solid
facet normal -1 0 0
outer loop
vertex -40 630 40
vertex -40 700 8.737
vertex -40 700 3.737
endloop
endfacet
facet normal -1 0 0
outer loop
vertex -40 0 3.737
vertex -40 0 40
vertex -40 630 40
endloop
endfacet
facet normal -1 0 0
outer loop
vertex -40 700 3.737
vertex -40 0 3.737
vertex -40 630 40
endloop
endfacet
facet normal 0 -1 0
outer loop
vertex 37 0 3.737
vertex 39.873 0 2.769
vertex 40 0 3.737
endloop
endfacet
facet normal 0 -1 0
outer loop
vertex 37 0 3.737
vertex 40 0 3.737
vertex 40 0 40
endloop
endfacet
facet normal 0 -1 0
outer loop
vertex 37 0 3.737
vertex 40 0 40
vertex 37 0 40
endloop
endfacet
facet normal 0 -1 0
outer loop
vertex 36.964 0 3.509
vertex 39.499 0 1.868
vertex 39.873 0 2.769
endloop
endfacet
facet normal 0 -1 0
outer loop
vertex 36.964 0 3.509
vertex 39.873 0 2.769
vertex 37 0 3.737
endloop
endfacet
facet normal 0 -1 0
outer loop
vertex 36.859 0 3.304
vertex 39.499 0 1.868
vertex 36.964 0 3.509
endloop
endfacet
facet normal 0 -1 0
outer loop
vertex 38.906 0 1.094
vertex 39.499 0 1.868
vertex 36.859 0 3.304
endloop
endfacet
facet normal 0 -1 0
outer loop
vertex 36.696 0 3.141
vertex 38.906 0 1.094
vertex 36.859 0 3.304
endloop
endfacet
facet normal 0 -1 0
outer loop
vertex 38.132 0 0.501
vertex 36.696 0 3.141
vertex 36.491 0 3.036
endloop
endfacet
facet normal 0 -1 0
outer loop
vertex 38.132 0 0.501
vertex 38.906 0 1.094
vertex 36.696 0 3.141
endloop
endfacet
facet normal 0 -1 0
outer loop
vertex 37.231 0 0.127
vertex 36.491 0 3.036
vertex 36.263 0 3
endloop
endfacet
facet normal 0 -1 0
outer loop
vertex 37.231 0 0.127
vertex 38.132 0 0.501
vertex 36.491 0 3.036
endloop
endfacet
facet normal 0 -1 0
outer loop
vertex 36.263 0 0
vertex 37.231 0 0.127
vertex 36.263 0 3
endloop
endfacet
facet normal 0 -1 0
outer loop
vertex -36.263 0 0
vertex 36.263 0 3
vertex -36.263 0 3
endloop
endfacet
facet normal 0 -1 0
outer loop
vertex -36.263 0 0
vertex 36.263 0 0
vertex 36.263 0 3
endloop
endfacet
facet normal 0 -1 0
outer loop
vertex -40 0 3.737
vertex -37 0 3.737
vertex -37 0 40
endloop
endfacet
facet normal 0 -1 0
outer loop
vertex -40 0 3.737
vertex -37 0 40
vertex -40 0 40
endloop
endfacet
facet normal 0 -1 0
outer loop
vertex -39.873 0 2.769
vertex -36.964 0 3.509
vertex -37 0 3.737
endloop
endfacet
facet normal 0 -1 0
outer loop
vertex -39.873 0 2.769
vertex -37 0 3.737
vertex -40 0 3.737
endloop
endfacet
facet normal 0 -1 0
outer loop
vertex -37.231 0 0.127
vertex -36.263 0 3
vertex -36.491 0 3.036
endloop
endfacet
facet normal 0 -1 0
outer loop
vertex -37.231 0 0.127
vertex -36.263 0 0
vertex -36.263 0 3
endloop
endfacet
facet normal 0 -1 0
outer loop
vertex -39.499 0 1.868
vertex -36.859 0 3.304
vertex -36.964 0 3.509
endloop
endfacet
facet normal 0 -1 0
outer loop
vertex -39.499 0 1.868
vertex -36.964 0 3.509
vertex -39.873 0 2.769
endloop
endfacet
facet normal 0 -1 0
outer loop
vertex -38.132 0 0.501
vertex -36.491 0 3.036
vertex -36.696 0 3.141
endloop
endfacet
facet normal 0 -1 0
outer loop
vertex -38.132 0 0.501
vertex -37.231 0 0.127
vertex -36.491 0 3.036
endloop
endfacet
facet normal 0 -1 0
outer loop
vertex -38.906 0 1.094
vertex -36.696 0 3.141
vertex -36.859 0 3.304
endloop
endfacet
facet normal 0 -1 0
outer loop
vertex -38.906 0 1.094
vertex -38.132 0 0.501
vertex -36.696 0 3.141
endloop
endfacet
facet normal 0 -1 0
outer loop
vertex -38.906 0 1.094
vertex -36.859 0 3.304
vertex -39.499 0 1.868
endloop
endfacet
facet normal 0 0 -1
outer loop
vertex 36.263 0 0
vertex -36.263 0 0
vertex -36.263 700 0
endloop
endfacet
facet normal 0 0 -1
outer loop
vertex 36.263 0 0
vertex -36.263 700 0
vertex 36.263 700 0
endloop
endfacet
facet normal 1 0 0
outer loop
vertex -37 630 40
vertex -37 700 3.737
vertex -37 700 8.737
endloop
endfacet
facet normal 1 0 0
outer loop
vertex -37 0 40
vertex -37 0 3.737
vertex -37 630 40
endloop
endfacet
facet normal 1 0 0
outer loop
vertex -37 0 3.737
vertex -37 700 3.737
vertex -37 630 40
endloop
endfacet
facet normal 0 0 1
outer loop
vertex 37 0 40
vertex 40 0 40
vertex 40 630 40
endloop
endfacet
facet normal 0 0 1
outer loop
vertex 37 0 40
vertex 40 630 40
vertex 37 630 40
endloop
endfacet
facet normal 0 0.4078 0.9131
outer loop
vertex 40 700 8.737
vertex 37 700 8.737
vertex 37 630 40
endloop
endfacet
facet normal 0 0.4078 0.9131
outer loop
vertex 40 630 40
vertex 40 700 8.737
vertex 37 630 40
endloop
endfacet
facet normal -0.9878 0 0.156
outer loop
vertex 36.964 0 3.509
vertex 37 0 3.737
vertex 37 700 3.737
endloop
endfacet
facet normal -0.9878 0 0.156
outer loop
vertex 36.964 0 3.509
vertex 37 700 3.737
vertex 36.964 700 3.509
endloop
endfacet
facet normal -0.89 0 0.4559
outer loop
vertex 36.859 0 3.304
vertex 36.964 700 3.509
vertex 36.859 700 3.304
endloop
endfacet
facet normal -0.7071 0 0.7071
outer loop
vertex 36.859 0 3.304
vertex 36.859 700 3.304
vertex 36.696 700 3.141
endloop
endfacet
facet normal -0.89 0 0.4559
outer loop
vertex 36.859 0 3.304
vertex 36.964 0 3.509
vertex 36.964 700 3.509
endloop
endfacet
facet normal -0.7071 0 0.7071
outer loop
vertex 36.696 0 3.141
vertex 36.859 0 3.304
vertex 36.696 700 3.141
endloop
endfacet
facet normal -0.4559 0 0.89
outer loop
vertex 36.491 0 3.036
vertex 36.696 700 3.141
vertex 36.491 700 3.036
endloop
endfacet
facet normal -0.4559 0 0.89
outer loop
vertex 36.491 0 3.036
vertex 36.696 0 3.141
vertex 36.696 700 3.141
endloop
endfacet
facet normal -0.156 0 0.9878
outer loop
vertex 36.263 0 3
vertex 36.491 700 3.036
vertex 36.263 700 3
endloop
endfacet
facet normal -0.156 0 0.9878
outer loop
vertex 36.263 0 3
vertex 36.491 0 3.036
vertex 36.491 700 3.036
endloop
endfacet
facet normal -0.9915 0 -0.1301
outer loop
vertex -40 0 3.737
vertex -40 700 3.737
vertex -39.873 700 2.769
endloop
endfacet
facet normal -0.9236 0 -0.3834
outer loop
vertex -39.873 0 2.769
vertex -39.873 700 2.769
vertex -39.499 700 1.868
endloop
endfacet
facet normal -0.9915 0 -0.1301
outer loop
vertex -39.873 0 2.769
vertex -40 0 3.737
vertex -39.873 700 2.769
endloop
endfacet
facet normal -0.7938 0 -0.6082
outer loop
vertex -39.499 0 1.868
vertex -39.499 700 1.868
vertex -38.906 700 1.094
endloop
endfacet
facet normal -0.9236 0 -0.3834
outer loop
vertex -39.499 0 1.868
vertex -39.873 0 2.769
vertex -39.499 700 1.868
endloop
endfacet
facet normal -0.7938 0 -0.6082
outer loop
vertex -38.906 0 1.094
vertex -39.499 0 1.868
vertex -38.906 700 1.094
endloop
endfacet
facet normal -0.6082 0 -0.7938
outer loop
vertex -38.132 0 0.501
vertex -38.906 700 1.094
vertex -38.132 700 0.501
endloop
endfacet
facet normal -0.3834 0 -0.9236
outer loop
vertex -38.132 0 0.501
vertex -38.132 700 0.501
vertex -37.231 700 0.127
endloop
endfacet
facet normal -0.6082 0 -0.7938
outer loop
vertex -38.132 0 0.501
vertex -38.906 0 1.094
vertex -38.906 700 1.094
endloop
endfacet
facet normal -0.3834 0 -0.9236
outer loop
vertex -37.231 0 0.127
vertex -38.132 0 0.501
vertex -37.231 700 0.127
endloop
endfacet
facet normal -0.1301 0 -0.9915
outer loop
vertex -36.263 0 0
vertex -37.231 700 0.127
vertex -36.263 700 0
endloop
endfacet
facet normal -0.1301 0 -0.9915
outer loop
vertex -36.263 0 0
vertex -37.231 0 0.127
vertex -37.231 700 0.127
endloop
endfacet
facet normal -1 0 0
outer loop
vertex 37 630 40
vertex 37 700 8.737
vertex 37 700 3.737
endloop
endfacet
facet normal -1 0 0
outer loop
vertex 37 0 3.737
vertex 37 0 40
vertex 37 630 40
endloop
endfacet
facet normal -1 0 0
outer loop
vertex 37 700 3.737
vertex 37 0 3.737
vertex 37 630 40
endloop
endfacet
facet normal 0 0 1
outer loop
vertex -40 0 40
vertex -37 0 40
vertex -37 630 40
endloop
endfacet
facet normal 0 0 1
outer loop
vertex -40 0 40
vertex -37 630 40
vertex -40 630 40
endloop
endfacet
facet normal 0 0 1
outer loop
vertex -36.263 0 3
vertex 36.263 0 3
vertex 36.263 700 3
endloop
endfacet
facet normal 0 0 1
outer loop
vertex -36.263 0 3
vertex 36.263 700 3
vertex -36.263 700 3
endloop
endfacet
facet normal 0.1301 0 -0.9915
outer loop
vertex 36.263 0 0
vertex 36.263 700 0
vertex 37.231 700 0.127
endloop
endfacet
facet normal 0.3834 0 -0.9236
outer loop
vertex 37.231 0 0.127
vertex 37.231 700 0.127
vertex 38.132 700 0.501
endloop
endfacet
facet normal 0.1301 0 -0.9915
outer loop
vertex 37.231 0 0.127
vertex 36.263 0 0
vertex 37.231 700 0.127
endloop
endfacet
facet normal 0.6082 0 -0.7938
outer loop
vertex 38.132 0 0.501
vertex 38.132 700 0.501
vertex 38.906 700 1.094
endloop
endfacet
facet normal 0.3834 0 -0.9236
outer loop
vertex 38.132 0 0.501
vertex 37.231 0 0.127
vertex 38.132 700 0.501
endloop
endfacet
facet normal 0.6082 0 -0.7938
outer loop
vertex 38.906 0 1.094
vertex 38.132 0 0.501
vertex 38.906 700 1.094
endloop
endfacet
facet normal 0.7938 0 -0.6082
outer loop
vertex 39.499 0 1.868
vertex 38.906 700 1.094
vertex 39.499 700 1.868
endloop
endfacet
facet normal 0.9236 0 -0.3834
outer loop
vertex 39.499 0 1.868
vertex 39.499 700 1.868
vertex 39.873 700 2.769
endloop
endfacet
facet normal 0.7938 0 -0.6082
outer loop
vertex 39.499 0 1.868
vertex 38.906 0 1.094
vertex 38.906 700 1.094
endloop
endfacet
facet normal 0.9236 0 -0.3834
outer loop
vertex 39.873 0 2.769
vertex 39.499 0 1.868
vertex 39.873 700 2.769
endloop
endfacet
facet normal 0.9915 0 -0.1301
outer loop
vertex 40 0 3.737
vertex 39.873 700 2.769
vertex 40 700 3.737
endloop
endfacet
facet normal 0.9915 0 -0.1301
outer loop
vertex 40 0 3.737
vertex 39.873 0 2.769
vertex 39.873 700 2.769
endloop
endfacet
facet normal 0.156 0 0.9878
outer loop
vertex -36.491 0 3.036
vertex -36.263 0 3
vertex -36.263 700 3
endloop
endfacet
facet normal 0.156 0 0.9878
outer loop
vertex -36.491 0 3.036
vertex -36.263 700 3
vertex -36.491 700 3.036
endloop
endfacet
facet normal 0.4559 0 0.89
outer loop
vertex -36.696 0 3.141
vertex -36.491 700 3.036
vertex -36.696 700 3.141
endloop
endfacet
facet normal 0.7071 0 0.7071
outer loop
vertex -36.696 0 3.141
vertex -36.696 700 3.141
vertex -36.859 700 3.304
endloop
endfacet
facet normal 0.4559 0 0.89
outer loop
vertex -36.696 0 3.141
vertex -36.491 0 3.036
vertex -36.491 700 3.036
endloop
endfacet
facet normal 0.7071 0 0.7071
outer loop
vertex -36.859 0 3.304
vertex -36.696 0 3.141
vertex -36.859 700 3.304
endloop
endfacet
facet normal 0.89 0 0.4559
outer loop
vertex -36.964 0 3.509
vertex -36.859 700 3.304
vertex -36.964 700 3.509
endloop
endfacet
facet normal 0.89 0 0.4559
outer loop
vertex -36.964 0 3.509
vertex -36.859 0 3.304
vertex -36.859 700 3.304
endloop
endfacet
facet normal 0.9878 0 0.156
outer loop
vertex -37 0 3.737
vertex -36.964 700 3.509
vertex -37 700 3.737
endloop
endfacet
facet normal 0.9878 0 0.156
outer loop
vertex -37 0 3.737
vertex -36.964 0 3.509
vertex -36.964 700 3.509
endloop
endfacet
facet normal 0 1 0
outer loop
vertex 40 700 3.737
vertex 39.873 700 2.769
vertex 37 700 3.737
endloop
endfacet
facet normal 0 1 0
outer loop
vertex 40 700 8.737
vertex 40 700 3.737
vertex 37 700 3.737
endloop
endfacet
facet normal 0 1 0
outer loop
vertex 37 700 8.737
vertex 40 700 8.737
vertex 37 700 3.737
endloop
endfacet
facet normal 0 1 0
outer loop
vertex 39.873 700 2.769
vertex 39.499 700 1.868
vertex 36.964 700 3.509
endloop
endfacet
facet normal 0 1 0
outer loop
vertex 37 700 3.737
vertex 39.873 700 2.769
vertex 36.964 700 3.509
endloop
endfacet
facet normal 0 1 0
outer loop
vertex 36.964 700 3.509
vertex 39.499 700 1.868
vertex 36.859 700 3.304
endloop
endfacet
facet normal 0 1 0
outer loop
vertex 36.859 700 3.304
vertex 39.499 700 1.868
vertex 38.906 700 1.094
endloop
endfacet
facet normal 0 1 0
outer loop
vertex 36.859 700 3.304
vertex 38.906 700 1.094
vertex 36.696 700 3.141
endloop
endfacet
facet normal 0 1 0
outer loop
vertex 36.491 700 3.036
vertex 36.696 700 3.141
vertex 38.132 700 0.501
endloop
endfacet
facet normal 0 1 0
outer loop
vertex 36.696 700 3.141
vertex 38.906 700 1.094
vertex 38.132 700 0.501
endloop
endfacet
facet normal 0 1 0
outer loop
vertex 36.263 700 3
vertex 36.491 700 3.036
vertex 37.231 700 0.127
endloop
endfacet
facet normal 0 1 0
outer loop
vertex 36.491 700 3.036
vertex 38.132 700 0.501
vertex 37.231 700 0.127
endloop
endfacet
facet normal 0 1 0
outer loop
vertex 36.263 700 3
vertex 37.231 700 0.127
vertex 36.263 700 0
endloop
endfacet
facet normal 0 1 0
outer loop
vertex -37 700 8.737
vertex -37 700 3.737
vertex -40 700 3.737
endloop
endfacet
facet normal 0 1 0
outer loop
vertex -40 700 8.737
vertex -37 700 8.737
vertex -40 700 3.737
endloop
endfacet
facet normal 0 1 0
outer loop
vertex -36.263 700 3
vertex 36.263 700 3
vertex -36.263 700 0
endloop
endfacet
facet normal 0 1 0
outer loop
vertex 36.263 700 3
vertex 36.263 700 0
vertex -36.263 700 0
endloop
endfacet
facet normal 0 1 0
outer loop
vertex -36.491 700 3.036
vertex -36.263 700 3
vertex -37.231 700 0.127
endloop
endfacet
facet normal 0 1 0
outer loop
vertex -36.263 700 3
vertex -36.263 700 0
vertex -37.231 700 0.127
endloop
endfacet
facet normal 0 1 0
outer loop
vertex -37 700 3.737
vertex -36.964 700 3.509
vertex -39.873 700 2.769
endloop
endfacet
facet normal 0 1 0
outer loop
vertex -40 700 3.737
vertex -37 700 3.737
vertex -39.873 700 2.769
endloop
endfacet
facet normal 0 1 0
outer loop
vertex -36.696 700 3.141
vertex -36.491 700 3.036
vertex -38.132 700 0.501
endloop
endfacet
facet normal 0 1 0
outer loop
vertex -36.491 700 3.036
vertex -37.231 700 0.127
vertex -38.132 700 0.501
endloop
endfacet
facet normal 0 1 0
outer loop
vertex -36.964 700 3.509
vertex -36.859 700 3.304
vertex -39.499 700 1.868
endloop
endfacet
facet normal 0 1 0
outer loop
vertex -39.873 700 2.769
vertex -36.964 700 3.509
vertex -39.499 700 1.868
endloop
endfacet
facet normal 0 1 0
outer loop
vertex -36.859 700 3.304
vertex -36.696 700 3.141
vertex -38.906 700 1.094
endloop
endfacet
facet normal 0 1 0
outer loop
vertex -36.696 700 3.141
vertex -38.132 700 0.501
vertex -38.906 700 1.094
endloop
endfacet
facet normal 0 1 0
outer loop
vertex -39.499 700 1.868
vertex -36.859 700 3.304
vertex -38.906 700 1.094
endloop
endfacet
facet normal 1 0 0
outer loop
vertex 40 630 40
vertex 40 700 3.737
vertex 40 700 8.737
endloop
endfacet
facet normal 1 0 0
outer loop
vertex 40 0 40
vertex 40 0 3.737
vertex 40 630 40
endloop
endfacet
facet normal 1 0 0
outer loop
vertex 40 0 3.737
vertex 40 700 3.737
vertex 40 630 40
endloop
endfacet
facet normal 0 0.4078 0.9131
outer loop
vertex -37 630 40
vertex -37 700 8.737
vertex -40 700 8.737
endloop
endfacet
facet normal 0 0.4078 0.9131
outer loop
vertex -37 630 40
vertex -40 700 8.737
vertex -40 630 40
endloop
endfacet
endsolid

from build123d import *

# Parameters (mm, degrees)
BASE_FLANGE1_DEPTH             = 700
CUT_EXTRUDE1_REACH             = 704.282
CUT_EXTRUDE1_DIRECTION_2_REACH = 704.282


# Sheet-metal steps are written as plain solids
with BuildPart() as part:
    # Sketch1 → Base-Flange1 (new body)
    with BuildSketch(Plane(origin=(0, 0, 0), x_dir=(1, 0, 0), z_dir=(0, 1, 0))):
        with BuildLine():
            Line((-40, -40), (-40, -3.7366))
            ThreePointArc((-40, -3.7366), (-38.905575199, -1.094424801), (-36.2634, 0))
            Line((-36.2634, 0), (36.2634, 0))
            ThreePointArc((36.2634, 0), (38.905575199, -1.094424801), (40, -3.7366))
            Line((40, -3.7366), (40, -40))
            Line((40, -40), (37, -40))
            Line((37, -40), (37, -3.7366))
            ThreePointArc((37, -3.7366), (36.784254855, -3.215745145), (36.2634, -3))
            Line((36.2634, -3), (-36.2634, -3))
            ThreePointArc((-36.2634, -3), (-36.784254855, -3.215745145), (-37, -3.7366))
            Line((-37, -3.7366), (-37, -40))
            Line((-37, -40), (-40, -40))
        make_face()
    extrude(amount=BASE_FLANGE1_DEPTH)

    # Cut-Extrude1: up to this face of the body (flat: up to its plane)
    cut_extrude1_end = Plane(part.part.faces().sort_by_distance((-40, 350, 21.8683))[0])
    # Sketch6 → Cut-Extrude1 (cut, up to the picked face)
    with BuildSketch(Plane(origin=(0, 0, 0), x_dir=(0, 0, -1), z_dir=(1, 0, 0)), mode=Mode.PRIVATE) as cut_extrude1_sk1:
        Polygon((-8.7366, 700), (-40, 630), (-40, 700), align=None)
    cut_extrude1_tool1 = split(extrude(cut_extrude1_sk1.sketch, amount=-CUT_EXTRUDE1_REACH, mode=Mode.PRIVATE), bisect_by=cut_extrude1_end, keep=Keep.BOTH, mode=Mode.PRIVATE)
    add(cut_extrude1_tool1.solids().sort_by(Axis((0, 676.666667, 29.578867), (-1, 0, 0)))[0], mode=Mode.SUBTRACT)

    # Cut-Extrude1 direction 2: up to this face of the body (flat: up to its plane)
    cut_extrude1_direction_2_end = Plane(part.part.faces().sort_by_distance((40, 350, 21.8683))[0])
    # Sketch6 → Cut-Extrude1 direction 2 (cut, up to the picked face)
    with BuildSketch(Plane(origin=(0, 0, 0), x_dir=(0, 0, -1), z_dir=(1, 0, 0)), mode=Mode.PRIVATE) as cut_extrude1_direction_2_sk1:
        Polygon((-8.7366, 700), (-40, 630), (-40, 700), align=None)
    cut_extrude1_direction_2_tool1 = split(extrude(cut_extrude1_direction_2_sk1.sketch, amount=CUT_EXTRUDE1_DIRECTION_2_REACH, mode=Mode.PRIVATE), bisect_by=cut_extrude1_direction_2_end, keep=Keep.BOTH, mode=Mode.PRIVATE)
    add(cut_extrude1_direction_2_tool1.solids().sort_by(Axis((0, 676.666667, 29.578867), (1, 0, 0)))[0], mode=Mode.SUBTRACT)


solid = part.part
